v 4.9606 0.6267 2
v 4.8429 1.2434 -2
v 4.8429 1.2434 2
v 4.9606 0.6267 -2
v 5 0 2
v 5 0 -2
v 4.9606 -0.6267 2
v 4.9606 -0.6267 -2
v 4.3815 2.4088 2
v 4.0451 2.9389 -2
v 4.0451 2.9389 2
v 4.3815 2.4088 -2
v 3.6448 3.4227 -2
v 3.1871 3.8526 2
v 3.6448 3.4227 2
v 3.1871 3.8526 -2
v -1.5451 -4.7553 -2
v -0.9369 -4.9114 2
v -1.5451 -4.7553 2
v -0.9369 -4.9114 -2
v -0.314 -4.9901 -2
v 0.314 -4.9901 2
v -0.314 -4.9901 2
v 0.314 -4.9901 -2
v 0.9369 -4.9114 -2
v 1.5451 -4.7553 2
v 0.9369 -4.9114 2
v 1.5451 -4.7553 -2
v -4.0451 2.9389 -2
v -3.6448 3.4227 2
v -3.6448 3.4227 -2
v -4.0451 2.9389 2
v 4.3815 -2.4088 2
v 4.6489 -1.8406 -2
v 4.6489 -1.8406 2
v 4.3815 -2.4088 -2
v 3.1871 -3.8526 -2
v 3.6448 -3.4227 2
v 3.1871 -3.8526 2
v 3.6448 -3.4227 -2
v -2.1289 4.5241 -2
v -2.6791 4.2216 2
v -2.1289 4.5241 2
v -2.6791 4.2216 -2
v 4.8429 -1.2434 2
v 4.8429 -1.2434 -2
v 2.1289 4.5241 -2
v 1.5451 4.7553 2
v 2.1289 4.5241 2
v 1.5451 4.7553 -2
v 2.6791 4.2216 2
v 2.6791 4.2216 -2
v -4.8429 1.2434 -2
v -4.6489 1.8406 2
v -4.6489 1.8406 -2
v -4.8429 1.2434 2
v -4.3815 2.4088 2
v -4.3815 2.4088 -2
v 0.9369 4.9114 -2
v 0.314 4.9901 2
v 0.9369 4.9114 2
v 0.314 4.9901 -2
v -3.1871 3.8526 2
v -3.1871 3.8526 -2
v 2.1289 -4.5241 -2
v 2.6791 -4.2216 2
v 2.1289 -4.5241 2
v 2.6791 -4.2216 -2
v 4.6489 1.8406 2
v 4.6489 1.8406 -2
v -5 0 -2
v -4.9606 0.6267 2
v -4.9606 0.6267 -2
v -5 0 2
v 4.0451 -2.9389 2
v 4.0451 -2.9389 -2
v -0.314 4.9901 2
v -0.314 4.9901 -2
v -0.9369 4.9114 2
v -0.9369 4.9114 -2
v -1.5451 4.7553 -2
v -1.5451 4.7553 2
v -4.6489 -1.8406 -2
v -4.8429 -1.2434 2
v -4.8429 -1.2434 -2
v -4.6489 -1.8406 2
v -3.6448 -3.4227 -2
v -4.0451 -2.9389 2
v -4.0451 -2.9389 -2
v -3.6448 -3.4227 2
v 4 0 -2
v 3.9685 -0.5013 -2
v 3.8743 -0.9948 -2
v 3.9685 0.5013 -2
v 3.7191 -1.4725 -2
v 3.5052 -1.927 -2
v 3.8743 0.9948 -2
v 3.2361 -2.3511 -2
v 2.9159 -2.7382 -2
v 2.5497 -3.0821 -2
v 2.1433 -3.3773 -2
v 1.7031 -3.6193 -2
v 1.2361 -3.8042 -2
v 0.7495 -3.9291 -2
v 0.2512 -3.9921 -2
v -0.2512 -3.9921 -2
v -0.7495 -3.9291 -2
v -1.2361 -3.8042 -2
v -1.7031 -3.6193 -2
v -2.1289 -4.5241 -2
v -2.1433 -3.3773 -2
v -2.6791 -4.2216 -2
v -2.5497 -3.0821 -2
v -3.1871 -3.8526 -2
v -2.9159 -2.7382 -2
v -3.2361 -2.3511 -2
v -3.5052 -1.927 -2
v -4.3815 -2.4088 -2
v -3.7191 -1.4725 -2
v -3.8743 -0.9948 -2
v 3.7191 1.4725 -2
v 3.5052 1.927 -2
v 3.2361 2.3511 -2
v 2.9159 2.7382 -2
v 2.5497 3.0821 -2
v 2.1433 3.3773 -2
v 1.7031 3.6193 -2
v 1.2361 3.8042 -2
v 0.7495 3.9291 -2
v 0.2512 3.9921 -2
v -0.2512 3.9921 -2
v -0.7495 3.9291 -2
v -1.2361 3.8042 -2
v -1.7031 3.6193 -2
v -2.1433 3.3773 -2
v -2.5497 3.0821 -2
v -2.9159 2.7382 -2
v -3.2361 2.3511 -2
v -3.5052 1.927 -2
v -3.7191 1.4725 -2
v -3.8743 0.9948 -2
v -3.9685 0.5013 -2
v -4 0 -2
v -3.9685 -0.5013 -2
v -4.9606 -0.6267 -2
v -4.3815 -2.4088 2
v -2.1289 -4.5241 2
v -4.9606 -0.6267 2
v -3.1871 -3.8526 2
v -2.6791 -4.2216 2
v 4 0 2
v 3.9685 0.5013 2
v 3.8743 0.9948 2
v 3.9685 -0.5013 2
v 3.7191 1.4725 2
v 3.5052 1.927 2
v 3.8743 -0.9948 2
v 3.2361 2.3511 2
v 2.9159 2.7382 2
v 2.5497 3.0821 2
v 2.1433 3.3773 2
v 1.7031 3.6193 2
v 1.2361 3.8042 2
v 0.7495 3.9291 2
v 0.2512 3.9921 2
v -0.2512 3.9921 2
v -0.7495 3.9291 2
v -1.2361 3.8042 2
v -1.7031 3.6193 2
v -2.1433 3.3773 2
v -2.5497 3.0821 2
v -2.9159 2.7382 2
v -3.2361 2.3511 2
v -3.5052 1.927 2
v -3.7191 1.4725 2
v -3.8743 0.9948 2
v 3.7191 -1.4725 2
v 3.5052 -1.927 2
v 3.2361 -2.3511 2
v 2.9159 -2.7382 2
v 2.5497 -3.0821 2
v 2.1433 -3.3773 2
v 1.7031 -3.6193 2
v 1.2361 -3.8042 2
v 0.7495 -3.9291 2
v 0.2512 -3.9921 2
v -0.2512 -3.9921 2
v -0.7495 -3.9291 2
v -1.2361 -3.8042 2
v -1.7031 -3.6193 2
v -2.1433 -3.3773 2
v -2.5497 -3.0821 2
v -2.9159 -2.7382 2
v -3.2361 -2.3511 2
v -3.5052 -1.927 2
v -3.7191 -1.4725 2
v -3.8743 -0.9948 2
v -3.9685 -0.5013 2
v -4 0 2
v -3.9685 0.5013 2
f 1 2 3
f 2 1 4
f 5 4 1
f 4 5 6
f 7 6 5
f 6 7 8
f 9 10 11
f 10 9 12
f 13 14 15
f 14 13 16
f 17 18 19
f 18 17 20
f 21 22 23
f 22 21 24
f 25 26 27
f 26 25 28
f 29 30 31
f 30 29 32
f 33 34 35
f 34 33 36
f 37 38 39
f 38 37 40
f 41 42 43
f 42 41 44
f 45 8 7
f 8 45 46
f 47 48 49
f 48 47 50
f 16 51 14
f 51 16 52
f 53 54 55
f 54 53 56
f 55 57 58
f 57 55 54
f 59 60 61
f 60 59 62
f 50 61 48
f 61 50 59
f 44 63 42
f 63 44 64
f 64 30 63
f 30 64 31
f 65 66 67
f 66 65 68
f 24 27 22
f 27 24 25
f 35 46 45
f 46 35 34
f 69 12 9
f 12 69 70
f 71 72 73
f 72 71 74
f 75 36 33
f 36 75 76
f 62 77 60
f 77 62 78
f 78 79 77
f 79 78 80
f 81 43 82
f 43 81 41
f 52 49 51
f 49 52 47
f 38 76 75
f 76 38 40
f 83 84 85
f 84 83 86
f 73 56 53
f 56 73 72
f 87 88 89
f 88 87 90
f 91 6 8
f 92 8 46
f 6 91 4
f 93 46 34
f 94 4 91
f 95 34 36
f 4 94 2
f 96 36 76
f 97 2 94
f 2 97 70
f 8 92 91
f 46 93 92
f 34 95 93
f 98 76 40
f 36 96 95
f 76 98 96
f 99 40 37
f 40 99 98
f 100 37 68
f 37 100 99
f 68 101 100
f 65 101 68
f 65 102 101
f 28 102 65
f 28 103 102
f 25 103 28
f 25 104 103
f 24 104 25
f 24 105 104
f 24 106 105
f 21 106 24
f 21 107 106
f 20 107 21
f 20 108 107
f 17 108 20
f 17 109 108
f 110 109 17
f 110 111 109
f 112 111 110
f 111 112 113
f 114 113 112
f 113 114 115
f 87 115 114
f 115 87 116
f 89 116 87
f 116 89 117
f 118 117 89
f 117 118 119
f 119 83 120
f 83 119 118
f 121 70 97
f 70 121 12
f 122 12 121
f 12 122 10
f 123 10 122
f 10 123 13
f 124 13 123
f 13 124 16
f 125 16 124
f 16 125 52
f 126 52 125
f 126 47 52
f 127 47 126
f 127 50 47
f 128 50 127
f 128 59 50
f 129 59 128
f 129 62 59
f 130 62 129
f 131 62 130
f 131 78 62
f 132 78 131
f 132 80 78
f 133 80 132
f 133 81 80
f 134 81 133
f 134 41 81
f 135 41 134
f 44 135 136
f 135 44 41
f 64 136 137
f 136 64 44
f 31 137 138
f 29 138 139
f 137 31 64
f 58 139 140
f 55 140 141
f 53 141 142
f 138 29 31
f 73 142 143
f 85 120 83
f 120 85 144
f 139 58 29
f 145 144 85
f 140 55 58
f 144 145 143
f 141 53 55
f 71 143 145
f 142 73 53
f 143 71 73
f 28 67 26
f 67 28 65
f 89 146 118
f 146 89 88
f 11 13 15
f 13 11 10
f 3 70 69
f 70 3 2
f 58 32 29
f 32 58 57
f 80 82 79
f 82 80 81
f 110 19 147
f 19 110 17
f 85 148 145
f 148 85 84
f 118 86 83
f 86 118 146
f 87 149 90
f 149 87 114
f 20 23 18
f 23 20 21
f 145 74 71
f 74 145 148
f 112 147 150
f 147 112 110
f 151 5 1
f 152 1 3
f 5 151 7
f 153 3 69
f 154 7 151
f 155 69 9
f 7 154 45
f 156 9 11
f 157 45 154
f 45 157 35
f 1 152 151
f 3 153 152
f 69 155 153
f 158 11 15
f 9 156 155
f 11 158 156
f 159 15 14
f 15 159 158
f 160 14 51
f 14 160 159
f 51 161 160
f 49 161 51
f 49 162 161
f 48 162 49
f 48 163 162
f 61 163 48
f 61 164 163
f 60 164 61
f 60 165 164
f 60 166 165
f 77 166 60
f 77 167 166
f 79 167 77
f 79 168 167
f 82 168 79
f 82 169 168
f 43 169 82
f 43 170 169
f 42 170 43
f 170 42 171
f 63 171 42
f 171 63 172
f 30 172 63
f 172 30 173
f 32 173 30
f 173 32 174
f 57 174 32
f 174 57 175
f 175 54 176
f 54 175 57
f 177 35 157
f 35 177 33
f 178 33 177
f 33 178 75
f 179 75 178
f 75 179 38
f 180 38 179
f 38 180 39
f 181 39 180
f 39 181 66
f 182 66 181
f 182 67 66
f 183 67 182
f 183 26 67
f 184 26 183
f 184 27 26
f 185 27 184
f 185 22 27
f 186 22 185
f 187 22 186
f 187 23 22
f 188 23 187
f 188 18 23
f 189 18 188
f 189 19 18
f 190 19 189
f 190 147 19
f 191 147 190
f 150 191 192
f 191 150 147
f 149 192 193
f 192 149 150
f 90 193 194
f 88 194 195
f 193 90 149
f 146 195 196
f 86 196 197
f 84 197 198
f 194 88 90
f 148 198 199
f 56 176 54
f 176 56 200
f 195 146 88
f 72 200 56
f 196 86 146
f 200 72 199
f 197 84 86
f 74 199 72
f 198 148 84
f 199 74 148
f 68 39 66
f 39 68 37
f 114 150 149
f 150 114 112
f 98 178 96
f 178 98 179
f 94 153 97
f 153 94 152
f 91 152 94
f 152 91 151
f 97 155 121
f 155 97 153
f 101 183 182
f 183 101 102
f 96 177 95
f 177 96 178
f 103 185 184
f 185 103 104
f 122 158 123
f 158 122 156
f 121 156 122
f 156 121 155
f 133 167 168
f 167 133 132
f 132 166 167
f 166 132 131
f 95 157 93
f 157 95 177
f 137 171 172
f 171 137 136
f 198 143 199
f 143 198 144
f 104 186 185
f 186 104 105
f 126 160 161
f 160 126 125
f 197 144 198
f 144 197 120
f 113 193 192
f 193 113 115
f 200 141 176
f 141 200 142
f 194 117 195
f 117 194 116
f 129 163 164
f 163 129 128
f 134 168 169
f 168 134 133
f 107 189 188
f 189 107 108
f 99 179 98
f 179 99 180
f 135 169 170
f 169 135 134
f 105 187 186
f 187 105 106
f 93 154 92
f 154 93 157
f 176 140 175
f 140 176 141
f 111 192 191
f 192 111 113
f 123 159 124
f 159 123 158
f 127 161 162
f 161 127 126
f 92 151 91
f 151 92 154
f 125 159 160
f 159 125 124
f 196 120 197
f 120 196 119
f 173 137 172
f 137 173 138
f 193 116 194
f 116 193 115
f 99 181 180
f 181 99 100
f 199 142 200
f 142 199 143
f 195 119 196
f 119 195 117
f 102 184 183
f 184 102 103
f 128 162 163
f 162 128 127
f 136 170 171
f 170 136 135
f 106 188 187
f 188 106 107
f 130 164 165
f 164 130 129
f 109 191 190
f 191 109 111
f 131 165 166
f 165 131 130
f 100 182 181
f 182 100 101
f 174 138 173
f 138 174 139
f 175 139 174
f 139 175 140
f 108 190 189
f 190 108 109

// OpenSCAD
$fn = 50;


difference() {
	union() {
		translate(v = [0, 0, -2.0000000000]) {
			cylinder(h = 4, r = 5.0000000000);
		}
	}
	union() {
		translate(v = [0, 0, -100.0000000000]) {
			cylinder(h = 200, r = 4.0000000000);
		}
	}
}
